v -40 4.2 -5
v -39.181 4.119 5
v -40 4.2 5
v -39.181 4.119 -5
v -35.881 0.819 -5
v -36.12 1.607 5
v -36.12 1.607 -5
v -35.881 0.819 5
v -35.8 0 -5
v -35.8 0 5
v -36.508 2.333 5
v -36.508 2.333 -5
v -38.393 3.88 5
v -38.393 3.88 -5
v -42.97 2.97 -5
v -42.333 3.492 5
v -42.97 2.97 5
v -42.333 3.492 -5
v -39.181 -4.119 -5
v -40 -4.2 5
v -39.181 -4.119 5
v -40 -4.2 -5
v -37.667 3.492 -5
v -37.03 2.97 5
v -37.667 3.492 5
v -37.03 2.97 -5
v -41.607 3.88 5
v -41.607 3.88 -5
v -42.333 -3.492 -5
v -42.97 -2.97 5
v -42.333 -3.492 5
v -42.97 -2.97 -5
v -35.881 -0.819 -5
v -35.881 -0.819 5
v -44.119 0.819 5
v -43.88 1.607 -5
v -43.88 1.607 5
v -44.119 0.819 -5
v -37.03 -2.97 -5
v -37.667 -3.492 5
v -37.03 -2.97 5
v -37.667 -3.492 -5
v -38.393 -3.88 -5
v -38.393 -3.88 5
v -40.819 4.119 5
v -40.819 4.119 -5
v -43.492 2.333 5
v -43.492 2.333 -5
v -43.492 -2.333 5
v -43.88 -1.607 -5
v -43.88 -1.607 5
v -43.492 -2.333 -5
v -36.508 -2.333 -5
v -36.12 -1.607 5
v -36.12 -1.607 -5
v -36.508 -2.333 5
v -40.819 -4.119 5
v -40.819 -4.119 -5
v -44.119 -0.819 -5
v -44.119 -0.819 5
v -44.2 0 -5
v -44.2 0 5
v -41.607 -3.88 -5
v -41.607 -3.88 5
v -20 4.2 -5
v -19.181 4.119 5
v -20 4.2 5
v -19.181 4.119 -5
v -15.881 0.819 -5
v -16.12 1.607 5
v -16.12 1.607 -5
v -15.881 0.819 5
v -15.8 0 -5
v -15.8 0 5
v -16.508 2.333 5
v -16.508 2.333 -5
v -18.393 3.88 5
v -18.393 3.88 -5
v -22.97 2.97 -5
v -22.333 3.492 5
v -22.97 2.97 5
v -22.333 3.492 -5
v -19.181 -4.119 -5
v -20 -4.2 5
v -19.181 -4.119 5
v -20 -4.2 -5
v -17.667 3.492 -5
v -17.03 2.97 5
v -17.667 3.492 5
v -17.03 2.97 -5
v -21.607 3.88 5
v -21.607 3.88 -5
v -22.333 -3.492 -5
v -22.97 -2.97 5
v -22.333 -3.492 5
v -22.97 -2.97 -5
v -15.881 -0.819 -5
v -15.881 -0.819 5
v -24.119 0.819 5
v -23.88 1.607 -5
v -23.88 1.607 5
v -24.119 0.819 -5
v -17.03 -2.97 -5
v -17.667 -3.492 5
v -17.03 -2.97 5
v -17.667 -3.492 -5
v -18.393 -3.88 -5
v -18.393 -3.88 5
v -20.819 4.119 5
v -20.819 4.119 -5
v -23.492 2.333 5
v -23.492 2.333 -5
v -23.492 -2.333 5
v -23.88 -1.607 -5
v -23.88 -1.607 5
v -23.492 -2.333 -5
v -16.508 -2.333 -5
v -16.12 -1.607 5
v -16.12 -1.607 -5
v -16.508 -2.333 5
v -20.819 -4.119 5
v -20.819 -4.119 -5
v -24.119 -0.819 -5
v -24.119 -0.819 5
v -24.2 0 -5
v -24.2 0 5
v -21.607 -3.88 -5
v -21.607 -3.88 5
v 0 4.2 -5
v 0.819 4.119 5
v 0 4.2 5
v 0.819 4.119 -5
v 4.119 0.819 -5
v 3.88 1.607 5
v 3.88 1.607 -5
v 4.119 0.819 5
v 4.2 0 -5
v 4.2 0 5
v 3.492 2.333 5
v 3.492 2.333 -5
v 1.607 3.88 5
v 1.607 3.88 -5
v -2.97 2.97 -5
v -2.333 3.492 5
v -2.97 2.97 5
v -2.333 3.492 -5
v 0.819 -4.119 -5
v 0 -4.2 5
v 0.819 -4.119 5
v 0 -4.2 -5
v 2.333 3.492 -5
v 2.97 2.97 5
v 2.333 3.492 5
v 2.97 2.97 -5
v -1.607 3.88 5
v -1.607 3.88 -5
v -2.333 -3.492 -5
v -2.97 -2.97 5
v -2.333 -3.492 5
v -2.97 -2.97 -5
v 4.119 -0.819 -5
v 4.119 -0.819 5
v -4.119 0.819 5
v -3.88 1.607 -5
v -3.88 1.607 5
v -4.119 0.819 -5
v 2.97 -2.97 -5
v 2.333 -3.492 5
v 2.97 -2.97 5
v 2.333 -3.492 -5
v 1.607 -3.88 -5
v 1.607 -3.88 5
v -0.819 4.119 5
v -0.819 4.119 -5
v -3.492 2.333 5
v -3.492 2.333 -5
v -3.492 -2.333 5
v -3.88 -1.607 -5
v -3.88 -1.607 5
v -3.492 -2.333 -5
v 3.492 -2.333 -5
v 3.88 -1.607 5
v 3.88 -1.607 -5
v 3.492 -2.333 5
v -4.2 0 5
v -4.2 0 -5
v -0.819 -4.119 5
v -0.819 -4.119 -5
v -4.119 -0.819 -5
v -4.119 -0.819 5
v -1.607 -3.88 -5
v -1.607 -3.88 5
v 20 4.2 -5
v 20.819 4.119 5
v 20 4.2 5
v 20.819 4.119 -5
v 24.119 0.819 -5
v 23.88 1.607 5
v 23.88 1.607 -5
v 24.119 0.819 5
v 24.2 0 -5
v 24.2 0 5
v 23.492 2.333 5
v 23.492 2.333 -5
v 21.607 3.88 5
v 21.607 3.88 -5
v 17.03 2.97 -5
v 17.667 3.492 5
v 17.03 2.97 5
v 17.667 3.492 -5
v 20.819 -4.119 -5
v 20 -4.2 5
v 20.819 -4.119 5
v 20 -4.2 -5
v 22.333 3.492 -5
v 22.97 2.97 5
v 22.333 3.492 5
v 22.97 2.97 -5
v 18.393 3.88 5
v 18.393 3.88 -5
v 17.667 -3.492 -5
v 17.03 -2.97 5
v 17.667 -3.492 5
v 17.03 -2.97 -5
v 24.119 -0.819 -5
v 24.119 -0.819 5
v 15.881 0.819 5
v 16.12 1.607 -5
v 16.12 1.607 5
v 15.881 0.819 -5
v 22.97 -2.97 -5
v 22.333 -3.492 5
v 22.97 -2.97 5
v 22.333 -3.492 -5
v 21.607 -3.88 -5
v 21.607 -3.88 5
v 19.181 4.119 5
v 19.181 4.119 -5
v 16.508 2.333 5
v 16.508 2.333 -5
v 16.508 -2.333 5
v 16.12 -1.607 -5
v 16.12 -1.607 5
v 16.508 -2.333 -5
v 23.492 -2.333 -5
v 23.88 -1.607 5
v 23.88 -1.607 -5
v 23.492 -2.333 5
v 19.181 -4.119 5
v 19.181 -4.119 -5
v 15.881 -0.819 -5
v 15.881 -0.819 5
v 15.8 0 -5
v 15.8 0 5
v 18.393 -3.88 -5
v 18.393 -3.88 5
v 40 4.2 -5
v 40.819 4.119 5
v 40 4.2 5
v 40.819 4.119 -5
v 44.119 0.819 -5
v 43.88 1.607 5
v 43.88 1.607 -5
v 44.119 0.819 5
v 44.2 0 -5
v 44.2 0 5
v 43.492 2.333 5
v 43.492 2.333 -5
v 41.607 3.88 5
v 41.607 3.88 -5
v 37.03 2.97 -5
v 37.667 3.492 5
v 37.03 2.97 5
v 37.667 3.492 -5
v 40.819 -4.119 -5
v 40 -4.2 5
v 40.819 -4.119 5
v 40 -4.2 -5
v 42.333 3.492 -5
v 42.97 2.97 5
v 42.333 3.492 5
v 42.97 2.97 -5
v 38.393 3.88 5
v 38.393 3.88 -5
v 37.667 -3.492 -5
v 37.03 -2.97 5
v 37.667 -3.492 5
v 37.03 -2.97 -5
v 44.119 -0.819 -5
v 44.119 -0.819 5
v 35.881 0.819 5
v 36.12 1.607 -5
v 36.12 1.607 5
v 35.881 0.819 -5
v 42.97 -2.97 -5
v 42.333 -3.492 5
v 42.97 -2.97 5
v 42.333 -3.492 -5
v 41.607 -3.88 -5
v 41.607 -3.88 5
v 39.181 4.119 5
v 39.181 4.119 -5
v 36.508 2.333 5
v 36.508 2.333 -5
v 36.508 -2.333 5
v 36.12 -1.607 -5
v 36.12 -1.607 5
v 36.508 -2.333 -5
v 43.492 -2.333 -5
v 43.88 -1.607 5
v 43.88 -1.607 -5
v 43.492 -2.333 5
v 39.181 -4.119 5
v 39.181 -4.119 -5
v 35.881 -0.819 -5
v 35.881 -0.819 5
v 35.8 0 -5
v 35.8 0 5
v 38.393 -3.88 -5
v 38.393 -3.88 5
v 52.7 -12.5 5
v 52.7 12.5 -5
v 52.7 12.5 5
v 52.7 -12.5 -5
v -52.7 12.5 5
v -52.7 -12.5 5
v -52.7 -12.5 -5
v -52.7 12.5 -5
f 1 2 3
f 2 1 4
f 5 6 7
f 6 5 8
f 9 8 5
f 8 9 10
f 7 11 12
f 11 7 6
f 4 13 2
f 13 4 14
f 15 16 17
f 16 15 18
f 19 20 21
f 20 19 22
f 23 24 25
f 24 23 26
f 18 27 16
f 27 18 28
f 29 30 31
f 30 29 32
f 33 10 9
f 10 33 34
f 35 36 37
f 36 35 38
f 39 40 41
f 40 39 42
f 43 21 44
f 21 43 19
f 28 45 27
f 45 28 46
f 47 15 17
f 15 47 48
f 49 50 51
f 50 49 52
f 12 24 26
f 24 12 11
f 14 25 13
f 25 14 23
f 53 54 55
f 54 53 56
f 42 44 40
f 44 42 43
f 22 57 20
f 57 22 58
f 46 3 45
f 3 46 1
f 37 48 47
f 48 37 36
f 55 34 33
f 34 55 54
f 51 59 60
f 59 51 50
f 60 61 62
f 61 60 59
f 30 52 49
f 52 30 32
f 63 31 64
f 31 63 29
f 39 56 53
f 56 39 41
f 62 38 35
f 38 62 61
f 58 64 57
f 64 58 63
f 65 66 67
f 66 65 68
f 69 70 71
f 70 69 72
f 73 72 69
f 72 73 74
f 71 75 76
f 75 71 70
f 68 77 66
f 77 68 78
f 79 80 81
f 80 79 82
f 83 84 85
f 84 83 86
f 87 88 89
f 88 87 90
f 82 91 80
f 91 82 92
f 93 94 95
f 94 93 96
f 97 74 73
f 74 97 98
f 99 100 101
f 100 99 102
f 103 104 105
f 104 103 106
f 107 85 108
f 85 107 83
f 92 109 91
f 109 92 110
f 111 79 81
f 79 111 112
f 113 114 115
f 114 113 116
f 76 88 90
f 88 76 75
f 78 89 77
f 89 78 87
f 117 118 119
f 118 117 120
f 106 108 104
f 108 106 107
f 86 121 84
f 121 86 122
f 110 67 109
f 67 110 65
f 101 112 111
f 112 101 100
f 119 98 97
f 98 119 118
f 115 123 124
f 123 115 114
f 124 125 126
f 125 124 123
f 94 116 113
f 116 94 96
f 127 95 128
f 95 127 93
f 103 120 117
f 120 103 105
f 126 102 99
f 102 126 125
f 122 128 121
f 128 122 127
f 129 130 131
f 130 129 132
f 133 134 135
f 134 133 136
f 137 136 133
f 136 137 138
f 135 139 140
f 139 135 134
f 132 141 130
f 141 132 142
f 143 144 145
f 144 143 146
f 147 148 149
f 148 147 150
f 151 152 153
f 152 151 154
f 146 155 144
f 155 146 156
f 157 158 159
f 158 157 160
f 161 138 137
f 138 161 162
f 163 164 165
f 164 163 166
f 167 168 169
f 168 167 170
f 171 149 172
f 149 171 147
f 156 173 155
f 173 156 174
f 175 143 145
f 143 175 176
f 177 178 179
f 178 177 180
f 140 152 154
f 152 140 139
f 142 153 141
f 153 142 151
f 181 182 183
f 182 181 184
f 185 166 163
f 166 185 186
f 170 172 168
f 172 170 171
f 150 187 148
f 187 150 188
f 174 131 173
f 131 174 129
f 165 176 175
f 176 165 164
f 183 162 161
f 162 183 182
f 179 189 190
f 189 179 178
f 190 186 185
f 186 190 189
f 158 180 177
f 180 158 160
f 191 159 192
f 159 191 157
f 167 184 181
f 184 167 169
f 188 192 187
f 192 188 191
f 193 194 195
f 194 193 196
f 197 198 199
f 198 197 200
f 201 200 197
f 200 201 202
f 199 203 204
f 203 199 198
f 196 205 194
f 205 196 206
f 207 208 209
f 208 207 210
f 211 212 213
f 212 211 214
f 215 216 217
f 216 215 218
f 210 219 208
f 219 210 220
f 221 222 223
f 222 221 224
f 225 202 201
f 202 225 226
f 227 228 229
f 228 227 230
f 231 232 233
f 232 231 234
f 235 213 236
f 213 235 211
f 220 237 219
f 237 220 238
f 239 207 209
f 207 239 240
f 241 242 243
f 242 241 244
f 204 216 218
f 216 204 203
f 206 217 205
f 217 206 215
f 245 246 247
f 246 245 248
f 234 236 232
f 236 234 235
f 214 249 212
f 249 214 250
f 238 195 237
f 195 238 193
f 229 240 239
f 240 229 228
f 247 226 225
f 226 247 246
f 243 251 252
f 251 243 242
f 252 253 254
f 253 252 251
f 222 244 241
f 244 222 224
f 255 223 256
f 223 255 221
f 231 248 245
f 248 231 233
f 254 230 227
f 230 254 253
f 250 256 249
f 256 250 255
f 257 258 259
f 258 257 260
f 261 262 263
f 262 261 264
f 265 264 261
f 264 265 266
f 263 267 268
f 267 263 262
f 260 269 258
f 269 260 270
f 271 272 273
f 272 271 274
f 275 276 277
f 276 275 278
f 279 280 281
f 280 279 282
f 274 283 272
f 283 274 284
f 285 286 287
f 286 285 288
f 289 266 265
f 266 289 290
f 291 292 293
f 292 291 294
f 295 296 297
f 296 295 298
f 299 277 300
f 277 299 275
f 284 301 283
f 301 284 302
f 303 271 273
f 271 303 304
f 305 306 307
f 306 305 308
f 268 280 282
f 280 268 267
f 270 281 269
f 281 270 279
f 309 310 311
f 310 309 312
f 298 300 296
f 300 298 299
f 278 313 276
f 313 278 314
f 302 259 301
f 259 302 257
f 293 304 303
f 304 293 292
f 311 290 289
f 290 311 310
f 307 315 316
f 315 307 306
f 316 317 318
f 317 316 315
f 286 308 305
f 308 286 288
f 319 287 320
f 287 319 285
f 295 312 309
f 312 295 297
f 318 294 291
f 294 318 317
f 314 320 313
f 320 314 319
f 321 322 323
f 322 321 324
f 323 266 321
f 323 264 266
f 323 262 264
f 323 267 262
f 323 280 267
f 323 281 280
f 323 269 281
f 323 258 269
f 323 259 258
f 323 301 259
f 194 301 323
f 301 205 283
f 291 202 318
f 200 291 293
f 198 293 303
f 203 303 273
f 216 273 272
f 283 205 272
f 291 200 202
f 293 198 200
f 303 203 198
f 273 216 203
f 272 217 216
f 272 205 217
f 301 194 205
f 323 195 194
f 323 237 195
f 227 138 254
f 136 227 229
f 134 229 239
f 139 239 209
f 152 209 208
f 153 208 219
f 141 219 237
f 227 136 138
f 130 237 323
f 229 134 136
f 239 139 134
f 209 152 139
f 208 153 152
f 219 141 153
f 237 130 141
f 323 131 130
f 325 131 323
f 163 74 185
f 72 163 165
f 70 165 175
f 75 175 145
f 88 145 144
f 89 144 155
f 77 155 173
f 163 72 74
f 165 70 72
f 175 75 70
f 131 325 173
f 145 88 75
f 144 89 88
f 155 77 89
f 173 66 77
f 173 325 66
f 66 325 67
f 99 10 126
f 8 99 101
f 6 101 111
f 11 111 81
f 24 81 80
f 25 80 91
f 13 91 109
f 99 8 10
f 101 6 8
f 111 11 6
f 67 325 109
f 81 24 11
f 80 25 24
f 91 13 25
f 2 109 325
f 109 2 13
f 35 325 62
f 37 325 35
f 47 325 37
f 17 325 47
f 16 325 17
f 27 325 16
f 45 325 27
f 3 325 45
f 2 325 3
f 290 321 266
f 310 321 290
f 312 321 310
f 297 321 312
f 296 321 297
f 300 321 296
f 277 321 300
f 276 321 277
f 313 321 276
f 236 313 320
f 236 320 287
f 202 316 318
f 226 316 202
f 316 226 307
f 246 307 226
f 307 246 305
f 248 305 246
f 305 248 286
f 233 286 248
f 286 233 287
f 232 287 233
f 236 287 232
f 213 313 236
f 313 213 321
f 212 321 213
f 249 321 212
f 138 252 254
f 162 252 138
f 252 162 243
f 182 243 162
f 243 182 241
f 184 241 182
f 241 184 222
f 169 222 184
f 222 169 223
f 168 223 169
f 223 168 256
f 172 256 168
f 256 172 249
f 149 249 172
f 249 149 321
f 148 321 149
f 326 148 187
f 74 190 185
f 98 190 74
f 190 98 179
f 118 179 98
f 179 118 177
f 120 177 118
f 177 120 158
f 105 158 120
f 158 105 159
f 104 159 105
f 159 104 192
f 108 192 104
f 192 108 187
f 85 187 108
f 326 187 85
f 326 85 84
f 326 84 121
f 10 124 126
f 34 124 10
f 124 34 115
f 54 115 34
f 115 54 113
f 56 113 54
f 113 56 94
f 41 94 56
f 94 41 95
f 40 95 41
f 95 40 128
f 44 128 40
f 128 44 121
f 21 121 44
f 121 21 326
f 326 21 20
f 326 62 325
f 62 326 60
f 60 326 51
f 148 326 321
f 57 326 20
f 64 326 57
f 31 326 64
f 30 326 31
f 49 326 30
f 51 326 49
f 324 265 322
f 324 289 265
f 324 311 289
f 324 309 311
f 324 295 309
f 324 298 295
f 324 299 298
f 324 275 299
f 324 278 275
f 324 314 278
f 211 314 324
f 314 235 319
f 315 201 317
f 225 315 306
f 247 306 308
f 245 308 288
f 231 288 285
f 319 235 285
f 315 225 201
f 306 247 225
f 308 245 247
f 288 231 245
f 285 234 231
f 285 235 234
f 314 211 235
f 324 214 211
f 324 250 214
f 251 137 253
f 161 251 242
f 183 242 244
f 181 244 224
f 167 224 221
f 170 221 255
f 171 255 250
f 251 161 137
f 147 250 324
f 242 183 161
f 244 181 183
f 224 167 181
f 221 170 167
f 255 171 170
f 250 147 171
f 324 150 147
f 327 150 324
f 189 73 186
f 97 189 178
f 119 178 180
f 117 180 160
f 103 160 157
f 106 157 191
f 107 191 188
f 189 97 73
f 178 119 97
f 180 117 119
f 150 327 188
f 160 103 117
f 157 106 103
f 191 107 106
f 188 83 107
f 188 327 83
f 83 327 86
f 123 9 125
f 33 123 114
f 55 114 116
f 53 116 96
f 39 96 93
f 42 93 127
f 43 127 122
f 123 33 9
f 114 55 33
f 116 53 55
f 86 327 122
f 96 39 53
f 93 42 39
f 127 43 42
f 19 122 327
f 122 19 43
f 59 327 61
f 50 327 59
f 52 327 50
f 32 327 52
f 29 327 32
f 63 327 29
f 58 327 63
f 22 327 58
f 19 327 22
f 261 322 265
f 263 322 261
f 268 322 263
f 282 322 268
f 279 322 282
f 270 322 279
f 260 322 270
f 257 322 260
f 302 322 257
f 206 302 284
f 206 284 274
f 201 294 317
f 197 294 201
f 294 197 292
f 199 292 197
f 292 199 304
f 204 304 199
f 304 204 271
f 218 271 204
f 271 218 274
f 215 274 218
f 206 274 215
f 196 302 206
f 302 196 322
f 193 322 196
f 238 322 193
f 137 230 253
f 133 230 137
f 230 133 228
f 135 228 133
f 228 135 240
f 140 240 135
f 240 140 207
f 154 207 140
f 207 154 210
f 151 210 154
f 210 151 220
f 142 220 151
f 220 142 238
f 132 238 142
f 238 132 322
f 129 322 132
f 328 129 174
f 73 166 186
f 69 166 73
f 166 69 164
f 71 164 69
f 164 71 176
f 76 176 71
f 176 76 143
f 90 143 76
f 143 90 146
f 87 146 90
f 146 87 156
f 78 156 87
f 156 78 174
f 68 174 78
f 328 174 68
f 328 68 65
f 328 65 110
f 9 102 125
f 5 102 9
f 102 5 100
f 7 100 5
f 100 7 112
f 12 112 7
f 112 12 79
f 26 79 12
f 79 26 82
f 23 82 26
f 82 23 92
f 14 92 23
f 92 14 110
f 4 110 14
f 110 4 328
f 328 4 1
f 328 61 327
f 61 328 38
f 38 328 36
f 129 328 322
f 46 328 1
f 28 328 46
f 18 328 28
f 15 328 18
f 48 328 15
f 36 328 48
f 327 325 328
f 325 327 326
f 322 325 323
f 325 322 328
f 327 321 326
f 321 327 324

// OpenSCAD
$fn = 32;

// ----------------------------------------------------------------------
// Hole bar, 5 x Ø8.4
// skip layout, 12.7 mm edge offset
// ----------------------------------------------------------------------

// --- parameters (mm) ---
bar_w = 25;       // bar width (Y)
bar_t = 10;       // bar thickness (Z)
holes = 5;        // holes per row
hole_d = 8.4;     // hole diameter
edge = 12.7;      // offset from the bar end to the first hole
grid_pitch = 10;  // grid the bar was laid out on

// --- derived feature positions (mm) ---
pitch = grid_pitch * 2;       // = 20   holes sit every other grid slot
span = (holes - 1) * pitch;   // = 80   distance between the end holes
bar_l = span + 2 * edge;      // = 105.4   overall bar length
start_x = -bar_l / 2 + edge;  // = -40   X of the first hole
feature_centers = [
  [start_x + 0 * pitch, 0],
  [start_x + 1 * pitch, 0],
  [start_x + 2 * pitch, 0],
  [start_x + 3 * pitch, 0],
  [start_x + 4 * pitch, 0]
];   // hole centres of the first row

// bar with one row of holes, drilled from feature_centers
difference() {
  translate([-bar_l / 2, -bar_w / 2, -bar_t / 2]) cube([bar_l, bar_w, bar_t]);
  for (centre = feature_centers)
    translate([centre[0], centre[1], 0])
      cylinder(d = hole_d, h = bar_t + 2, center = true);
}
